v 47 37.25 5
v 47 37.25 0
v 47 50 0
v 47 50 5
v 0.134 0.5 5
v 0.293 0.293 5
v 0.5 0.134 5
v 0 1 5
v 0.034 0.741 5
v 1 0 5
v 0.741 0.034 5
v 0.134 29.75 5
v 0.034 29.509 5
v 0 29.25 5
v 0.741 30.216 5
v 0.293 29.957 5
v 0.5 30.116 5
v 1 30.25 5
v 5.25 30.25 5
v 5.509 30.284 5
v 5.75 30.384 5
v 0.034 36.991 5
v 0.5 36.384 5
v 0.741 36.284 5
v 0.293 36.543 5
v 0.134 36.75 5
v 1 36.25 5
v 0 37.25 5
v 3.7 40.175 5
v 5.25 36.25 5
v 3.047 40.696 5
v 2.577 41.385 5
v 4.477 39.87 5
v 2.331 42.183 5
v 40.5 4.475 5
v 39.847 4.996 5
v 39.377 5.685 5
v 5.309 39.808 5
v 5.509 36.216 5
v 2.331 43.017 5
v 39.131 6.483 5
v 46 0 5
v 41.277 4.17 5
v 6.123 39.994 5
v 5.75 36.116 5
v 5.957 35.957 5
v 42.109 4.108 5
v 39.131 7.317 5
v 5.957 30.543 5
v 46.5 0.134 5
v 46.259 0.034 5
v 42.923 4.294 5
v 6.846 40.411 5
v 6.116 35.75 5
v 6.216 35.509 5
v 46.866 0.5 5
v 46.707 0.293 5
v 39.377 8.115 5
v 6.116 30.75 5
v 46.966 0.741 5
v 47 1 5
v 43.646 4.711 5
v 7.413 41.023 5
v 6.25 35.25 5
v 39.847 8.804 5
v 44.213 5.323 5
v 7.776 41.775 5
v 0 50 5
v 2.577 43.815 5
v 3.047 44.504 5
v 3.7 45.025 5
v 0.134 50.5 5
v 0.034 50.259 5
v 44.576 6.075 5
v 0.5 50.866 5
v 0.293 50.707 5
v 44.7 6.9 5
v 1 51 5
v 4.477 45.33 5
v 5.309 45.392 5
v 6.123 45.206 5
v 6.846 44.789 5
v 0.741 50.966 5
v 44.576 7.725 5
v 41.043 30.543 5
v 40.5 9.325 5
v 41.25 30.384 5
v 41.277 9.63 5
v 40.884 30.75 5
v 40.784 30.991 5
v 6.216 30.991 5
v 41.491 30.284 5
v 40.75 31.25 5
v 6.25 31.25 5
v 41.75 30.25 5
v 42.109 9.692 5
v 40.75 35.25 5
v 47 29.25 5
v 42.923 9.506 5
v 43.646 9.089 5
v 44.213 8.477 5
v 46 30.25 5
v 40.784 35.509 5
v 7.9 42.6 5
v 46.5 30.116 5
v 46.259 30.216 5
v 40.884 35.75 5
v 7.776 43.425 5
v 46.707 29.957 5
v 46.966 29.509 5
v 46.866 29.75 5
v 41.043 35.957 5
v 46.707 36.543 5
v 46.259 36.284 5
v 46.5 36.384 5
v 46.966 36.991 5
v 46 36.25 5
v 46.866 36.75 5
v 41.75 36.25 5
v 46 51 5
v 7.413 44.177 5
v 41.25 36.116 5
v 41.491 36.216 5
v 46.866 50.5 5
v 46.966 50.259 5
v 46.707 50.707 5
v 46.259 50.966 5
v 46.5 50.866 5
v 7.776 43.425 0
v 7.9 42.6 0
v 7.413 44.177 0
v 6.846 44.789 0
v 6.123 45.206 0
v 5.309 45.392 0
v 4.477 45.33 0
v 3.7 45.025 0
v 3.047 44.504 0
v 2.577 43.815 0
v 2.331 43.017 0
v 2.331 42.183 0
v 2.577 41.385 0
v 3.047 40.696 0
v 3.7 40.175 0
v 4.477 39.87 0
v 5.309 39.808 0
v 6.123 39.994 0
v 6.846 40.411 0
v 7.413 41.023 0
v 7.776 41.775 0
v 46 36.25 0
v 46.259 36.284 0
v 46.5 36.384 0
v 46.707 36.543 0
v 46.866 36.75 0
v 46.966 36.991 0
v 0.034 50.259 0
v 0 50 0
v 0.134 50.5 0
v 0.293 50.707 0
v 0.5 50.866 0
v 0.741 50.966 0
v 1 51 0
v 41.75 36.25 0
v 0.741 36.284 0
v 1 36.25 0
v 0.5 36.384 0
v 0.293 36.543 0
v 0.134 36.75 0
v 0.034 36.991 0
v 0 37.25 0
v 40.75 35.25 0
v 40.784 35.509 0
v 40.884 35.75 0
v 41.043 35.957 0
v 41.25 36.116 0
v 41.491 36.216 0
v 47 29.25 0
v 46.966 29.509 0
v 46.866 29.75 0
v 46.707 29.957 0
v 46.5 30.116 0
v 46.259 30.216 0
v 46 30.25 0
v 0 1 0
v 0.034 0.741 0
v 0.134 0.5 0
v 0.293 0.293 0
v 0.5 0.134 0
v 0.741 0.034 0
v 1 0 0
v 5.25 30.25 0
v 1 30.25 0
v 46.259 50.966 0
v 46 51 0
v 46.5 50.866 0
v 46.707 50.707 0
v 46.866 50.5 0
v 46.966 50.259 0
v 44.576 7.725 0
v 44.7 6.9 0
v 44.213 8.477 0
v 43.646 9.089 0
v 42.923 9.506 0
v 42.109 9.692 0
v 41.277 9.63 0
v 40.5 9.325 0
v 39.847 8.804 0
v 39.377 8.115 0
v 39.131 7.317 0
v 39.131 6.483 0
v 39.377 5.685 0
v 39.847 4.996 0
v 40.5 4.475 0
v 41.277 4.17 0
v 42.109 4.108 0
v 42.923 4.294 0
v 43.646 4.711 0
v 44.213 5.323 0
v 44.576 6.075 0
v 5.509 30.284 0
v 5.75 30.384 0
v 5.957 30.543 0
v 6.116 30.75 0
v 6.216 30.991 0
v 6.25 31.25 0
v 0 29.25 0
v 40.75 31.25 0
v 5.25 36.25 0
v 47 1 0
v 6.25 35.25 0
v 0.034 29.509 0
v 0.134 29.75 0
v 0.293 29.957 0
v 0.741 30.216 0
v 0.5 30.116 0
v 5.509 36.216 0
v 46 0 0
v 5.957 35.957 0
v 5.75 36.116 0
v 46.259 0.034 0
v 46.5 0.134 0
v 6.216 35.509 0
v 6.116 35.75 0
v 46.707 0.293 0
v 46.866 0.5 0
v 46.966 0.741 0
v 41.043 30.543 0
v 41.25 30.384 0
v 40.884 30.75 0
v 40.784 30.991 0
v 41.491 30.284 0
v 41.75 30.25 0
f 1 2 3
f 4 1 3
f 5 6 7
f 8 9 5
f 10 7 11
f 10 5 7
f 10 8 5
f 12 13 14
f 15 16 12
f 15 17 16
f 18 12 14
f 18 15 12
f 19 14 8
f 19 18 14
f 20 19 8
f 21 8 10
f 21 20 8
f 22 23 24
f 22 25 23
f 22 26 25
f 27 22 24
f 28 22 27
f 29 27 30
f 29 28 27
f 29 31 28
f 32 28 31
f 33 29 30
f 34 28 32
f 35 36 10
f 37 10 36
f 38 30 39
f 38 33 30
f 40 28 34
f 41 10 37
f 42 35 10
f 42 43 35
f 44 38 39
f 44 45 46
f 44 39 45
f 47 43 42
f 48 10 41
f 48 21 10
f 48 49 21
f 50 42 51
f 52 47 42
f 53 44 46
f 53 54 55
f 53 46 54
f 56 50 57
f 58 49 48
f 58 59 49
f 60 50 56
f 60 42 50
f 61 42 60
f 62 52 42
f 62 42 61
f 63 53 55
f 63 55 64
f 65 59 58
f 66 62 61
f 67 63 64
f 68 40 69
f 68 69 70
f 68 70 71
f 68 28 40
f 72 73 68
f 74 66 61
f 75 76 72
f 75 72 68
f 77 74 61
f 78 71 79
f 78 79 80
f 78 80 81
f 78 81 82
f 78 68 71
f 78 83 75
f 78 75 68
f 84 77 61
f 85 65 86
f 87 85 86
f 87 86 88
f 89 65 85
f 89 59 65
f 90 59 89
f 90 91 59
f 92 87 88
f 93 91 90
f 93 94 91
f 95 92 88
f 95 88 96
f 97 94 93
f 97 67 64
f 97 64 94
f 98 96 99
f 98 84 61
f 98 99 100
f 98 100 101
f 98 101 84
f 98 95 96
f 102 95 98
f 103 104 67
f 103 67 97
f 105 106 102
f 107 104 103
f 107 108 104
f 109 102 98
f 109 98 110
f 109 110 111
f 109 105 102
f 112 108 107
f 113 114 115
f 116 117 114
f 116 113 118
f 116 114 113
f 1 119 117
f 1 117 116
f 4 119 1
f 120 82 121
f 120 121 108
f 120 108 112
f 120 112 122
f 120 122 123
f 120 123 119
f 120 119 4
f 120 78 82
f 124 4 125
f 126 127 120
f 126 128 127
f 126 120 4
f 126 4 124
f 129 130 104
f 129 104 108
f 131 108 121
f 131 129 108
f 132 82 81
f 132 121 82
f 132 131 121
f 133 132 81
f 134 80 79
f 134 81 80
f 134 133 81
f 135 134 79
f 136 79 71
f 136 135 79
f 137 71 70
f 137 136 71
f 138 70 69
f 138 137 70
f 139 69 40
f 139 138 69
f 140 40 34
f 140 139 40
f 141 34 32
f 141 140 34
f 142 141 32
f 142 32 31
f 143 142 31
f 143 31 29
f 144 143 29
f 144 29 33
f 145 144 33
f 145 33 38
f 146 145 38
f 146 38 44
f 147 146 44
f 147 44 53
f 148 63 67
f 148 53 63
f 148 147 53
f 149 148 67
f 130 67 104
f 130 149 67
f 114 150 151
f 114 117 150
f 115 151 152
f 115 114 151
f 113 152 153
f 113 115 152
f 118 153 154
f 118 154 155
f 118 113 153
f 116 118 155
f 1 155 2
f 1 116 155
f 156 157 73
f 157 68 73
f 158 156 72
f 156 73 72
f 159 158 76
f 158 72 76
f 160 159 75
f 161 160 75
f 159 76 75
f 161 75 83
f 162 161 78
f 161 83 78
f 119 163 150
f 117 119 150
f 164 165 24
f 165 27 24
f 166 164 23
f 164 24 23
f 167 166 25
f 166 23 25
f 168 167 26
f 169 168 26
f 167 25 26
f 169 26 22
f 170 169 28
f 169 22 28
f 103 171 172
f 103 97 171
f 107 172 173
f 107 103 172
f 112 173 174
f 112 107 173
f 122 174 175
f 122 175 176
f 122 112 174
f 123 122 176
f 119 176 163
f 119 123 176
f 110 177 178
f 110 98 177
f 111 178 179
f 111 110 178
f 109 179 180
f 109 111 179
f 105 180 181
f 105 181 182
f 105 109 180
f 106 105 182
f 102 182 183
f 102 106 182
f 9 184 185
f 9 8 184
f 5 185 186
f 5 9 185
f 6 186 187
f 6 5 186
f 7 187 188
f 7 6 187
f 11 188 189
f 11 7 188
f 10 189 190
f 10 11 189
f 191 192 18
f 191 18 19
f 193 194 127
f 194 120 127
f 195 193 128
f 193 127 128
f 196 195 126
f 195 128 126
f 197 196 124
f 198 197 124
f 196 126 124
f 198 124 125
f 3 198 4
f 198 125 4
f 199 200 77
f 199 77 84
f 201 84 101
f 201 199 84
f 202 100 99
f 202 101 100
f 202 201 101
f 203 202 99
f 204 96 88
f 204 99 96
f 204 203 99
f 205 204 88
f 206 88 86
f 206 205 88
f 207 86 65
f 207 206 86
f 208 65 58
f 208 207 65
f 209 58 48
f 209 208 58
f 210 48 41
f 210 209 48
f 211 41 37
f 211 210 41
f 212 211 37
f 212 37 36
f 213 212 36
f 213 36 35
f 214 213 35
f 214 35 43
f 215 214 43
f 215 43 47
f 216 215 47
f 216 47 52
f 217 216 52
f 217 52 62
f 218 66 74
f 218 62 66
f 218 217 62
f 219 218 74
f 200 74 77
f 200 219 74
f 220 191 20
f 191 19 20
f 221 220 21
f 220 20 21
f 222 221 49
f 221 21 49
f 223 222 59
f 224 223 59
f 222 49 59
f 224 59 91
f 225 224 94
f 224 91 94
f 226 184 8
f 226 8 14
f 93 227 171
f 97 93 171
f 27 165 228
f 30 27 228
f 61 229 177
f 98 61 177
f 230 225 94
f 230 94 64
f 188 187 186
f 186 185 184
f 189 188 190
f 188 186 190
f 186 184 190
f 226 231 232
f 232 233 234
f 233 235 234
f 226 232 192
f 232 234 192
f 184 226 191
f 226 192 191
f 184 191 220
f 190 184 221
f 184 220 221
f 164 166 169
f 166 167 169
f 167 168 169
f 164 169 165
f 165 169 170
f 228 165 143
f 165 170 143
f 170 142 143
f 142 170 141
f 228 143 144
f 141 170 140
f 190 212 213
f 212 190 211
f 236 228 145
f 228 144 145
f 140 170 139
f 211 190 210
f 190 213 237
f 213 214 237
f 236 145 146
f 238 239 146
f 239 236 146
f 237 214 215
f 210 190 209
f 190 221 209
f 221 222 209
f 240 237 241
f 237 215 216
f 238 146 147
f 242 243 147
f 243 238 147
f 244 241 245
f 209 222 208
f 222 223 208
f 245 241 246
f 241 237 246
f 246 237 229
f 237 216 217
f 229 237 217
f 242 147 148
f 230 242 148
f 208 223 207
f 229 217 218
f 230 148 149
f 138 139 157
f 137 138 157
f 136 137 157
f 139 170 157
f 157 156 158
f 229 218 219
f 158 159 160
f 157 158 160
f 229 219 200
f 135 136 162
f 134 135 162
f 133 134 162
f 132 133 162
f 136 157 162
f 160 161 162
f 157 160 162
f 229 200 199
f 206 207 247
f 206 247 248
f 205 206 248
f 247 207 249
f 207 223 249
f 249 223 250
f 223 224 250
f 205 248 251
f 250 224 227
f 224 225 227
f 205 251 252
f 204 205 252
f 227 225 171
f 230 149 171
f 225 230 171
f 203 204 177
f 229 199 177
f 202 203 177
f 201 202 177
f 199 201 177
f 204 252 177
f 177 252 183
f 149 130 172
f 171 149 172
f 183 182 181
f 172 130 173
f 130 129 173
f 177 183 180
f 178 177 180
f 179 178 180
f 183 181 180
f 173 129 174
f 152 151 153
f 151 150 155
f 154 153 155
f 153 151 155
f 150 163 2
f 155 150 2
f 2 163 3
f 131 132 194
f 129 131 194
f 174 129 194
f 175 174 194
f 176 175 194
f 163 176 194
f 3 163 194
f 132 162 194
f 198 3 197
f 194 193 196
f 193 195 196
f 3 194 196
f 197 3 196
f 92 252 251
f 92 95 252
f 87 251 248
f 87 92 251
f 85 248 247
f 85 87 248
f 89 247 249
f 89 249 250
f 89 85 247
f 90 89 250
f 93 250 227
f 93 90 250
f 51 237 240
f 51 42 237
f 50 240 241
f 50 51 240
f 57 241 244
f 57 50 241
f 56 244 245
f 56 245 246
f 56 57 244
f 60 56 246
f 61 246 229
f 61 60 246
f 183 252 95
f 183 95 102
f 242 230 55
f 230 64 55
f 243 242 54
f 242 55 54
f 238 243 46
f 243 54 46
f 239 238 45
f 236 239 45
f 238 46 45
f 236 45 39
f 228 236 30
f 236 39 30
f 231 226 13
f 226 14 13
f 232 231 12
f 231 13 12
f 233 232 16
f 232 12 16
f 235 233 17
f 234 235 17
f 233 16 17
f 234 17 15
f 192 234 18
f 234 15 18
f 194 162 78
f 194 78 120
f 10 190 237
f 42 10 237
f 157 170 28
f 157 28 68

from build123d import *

# Parameters (mm, degrees)
BOX002_W          = 6.25
BOX002_H          = 6
BOX002_DEPTH      = 10
BOX001_W          = 6.25
BOX001_H          = 6
BOX001_DEPTH      = 10
CYLINDER001_R     = 2.8
CYLINDER001_DEPTH = 10
CYLINDER_R        = 2.8
CYLINDER_DEPTH    = 10
BOX_W             = 47
BOX_H             = 51
BOX_DEPTH         = 5
FILLET_R          = 1
FILLET001_R       = 1
FILLET002_R       = 1


with BuildPart() as cube002:
    # Box002 → Box002 (new body)
    with BuildSketch(Plane(origin=(40.75, 30.25, -2), x_dir=(1, 0, 0), z_dir=(0, 0, 1))):
        with Locations((3.125, 3)):
            Rectangle(BOX002_W, BOX002_H)
    extrude(amount=BOX002_DEPTH)


with BuildPart() as fusion:
    # Box001 → Box001 (new body)
    with BuildSketch(Plane(origin=(0, 30.25, -2), x_dir=(1, 0, 0), z_dir=(0, 0, 1))):
        with Locations((3.125, 3)):
            Rectangle(BOX001_W, BOX001_H)
    extrude(amount=BOX001_DEPTH)

    # Fusion: union Cube002
    add(cube002.part)


with BuildPart() as cylinder001:
    # Cylinder001 → Cylinder001 (new body)
    with BuildSketch(Plane(origin=(41.9, 6.9, -2), x_dir=(1, 0, 0), z_dir=(0, 0, 1))):
        Circle(CYLINDER001_R)
    extrude(amount=CYLINDER001_DEPTH)


with BuildPart() as cylinder:
    # Cylinder → Cylinder (new body)
    with BuildSketch(Plane(origin=(5.1, 42.6, -2), x_dir=(1, 0, 0), z_dir=(0, 0, 1))):
        Circle(CYLINDER_R)
    extrude(amount=CYLINDER_DEPTH)


with BuildPart() as fillet002:
    # Box → Box (new body)
    with BuildSketch(Plane.XY):
        with Locations((23.5, 25.5)):
            Rectangle(BOX_W, BOX_H)
    extrude(amount=BOX_DEPTH)

    # Cut: cut Cylinder
    add(cylinder.part, mode=Mode.SUBTRACT)

    # Cut001: cut Cylinder001
    add(cylinder001.part, mode=Mode.SUBTRACT)

    # Cut002: cut Fusion
    add(fusion.part, mode=Mode.SUBTRACT)

    # Fillet
    fillet_edges = [fillet002.edges().sort_by_distance(p)[0] for p in [
        (0, 0, 2.5),
        (47, 0, 2.5),
        (0, 51, 2.5),
        (47, 51, 2.5),
    ]]
    fillet(fillet_edges, radius=FILLET_R)

    # Fillet001
    fillet001_edges = [fillet002.edges().sort_by_distance(p)[0] for p in [
        (0, 30.25, 2.5),
        (0, 36.25, 2.5),
        (47, 30.25, 2.5),
        (47, 36.25, 2.5),
    ]]
    fillet(fillet001_edges, radius=FILLET001_R)

    # Fillet002
    fillet002_edges = [fillet002.edges().sort_by_distance(p)[0] for p in [
        (6.25, 30.25, 2.5),
        (6.25, 36.25, 2.5),
        (40.75, 30.25, 2.5),
        (40.75, 36.25, 2.5),
    ]]
    fillet(fillet002_edges, radius=FILLET002_R)


solid = fillet002.part
